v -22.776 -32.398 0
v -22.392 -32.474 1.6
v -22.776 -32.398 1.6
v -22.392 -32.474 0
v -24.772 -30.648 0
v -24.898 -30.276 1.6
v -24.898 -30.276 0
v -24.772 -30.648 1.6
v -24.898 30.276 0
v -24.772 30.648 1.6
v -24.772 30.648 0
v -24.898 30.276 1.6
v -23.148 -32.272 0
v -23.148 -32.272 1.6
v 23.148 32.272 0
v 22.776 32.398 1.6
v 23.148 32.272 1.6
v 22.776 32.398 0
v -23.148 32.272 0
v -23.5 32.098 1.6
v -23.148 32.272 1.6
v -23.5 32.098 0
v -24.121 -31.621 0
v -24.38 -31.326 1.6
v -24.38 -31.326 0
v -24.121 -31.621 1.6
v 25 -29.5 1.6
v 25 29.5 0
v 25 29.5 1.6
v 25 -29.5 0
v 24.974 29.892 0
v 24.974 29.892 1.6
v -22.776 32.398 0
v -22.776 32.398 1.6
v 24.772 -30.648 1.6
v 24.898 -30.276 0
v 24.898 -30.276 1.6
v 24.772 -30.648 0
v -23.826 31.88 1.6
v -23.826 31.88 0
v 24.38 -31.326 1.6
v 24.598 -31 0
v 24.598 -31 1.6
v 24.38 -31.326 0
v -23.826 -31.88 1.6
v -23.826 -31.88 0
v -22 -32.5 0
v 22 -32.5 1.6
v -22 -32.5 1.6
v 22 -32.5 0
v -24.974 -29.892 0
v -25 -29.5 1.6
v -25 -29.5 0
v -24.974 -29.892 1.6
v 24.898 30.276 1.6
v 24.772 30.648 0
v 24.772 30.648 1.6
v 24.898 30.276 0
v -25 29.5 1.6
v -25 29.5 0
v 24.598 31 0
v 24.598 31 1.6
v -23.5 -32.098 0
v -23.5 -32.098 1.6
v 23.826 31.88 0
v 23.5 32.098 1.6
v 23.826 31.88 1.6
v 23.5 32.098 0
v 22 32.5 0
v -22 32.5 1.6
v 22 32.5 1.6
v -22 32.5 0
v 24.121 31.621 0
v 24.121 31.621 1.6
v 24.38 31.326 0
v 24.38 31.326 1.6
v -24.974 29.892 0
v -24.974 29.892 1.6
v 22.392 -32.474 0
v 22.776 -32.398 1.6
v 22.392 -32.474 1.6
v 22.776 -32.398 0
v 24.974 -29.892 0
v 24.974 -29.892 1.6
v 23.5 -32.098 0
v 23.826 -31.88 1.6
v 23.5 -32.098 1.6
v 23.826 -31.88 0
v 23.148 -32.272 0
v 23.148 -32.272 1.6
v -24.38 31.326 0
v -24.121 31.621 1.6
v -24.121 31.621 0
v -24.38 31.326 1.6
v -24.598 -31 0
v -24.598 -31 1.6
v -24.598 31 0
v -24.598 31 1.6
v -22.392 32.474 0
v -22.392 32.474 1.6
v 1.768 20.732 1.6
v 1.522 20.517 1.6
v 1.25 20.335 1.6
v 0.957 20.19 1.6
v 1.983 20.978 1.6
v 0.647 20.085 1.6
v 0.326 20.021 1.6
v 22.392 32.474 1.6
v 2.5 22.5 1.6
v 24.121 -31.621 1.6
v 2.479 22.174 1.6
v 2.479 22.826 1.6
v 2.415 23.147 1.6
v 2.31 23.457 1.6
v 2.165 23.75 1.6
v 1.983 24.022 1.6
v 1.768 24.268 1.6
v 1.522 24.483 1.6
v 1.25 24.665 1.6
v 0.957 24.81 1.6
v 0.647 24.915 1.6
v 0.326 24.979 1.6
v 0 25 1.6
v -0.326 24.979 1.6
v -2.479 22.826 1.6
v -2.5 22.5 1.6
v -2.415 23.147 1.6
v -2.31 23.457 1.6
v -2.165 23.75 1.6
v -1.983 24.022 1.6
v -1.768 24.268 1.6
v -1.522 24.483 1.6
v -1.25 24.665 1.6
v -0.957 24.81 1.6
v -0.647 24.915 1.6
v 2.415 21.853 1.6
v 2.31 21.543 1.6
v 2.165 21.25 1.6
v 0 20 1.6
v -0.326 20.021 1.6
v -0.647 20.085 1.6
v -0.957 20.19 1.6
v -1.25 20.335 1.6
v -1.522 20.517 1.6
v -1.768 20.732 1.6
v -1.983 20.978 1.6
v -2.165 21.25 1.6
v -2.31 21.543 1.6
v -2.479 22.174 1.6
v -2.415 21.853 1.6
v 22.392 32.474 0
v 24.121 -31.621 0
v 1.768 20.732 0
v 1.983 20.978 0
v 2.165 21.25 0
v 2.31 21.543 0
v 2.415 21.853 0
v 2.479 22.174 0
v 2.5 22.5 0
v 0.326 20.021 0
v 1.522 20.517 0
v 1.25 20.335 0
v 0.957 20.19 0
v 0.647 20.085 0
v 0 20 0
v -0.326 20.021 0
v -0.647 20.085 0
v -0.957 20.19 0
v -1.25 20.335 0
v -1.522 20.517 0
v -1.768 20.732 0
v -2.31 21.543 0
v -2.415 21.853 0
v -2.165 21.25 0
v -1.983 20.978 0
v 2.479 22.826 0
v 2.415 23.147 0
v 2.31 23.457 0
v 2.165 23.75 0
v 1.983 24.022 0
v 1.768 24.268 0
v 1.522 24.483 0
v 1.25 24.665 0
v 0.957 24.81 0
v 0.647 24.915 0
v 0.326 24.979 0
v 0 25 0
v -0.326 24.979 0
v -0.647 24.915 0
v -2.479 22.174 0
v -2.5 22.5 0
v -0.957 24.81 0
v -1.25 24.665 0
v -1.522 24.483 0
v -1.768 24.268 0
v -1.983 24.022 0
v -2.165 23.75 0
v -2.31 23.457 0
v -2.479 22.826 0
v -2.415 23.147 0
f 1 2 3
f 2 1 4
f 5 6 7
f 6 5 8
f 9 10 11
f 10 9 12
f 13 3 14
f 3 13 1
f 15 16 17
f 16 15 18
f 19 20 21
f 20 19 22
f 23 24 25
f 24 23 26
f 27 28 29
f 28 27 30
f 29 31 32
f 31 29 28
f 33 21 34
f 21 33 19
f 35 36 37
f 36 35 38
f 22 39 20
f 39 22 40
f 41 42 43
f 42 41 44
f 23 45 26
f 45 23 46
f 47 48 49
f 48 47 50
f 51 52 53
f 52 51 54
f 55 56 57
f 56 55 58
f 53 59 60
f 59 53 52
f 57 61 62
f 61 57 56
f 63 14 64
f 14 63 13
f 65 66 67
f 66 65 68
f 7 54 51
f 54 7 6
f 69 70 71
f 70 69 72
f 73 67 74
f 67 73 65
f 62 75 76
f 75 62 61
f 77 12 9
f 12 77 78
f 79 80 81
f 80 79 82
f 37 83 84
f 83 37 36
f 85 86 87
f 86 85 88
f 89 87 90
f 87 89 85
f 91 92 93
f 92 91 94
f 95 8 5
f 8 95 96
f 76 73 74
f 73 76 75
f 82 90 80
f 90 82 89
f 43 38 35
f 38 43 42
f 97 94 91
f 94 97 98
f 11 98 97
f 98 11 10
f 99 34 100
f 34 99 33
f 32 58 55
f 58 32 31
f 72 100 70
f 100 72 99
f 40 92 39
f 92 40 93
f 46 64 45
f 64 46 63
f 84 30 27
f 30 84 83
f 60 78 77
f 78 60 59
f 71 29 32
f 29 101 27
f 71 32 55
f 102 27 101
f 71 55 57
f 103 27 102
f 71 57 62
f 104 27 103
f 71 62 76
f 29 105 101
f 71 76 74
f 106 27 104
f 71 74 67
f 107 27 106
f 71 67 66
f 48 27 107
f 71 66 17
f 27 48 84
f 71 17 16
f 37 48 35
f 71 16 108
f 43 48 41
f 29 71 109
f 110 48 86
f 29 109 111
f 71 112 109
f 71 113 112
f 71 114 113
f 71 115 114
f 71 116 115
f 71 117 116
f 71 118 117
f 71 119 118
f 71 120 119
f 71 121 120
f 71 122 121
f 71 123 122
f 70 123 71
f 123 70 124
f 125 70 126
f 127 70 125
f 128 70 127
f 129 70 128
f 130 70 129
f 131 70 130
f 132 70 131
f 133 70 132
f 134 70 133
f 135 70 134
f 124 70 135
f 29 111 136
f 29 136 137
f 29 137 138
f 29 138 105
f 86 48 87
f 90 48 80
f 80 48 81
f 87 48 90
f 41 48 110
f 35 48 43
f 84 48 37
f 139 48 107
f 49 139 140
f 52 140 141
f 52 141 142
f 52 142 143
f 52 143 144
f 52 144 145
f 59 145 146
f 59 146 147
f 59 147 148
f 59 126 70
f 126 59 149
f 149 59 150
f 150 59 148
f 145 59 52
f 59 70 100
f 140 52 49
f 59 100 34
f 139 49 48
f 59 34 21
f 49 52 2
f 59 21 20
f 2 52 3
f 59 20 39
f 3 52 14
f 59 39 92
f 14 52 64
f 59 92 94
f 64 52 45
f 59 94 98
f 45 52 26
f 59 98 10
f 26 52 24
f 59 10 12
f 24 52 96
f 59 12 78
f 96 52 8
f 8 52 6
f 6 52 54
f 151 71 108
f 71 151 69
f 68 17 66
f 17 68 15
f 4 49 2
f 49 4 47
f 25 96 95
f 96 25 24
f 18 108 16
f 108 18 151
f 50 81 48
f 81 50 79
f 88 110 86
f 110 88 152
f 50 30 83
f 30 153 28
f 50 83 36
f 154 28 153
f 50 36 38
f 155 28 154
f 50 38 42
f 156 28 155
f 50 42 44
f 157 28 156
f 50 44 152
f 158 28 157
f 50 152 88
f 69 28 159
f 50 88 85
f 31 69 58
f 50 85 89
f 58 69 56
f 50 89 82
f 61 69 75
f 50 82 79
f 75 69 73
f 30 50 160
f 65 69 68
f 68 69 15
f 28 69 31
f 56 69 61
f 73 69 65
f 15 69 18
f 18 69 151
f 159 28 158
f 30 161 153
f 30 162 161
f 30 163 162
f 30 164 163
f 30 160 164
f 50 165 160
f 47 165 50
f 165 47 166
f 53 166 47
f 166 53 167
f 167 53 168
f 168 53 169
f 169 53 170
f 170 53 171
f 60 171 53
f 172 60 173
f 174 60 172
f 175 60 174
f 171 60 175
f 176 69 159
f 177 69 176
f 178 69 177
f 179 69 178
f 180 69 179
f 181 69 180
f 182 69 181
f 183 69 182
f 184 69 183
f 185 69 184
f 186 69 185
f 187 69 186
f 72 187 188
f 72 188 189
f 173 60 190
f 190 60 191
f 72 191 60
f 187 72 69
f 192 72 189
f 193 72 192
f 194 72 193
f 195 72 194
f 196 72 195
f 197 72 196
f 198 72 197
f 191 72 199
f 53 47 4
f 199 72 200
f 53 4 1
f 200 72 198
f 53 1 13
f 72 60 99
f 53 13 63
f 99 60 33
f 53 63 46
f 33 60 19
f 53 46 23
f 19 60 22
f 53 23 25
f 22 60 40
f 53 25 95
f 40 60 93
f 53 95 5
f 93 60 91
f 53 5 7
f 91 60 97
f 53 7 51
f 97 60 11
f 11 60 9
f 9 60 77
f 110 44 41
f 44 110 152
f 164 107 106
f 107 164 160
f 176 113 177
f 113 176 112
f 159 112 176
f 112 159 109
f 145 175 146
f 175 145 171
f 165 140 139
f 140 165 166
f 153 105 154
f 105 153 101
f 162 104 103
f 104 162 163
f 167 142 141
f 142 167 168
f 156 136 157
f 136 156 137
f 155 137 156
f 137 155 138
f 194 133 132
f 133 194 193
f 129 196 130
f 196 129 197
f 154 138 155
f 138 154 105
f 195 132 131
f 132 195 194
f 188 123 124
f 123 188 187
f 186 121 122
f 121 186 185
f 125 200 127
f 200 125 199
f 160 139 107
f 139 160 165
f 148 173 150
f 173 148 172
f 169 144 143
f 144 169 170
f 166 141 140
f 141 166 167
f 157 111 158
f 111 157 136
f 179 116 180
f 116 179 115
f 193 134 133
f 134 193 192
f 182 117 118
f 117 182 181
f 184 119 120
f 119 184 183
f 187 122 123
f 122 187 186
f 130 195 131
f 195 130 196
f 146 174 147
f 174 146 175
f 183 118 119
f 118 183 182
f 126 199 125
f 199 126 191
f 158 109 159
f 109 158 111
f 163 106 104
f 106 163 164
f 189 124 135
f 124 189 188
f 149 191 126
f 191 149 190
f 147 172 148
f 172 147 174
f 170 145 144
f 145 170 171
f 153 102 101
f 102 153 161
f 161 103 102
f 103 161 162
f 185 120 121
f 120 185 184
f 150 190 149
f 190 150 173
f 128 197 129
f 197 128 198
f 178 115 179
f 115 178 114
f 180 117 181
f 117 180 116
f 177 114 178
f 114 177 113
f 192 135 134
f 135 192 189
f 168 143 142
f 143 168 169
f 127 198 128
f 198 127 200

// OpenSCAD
// file: media/odoo_qr_modules.scad
// Auto-generated QR module coordinates
qr_modules = [
    [0, 0],
    [0, 1],
    [0, 2],
    [0, 3],
    [0, 4],
    [0, 5],
    [0, 6],
    [0, 8],
    [0, 9],
    [0, 10],
    [0, 13],
    [0, 14],
    [0, 15],
    [0, 16],
    [0, 18],
    [0, 19],
    [0, 20],
    [0, 21],
    [0, 22],
    [0, 23],
    [0, 24],
    [1, 0],
    [1, 6],
    [1, 8],
    [1, 10],
    [1, 13],
    [1, 14],
    [1, 18],
    [1, 24],
    [2, 0],
    [2, 2],
    [2, 3],
    [2, 4],
    [2, 6],
    [2, 9],
    [2, 11],
    [2, 13],
    [2, 18],
    [2, 20],
    [2, 21],
    [2, 22],
    [2, 24],
    [3, 0],
    [3, 2],
    [3, 3],
    [3, 4],
    [3, 6],
    [3, 8],
    [3, 12],
    [3, 13],
    [3, 14],
    [3, 16],
    [3, 18],
    [3, 20],
    [3, 21],
    [3, 22],
    [3, 24],
    [4, 0],
    [4, 2],
    [4, 3],
    [4, 4],
    [4, 6],
    [4, 8],
    [4, 11],
    [4, 14],
    [4, 18],
    [4, 20],
    [4, 21],
    [4, 22],
    [4, 24],
    [5, 0],
    [5, 6],
    [5, 10],
    [5, 11],
    [5, 12],
    [5, 15],
    [5, 16],
    [5, 18],
    [5, 24],
    [6, 0],
    [6, 1],
    [6, 2],
    [6, 3],
    [6, 4],
    [6, 5],
    [6, 6],
    [6, 8],
    [6, 10],
    [6, 12],
    [6, 14],
    [6, 16],
    [6, 18],
    [6, 19],
    [6, 20],
    [6, 21],
    [6, 22],
    [6, 23],
    [6, 24],
    [7, 9],
    [7, 11],
    [7, 13],
    [7, 16],
    [8, 0],
    [8, 6],
    [8, 7],
    [8, 10],
    [8, 13],
    [8, 14],
    [8, 15],
    [8, 17],
    [8, 20],
    [8, 21],
    [8, 23],
    [8, 24],
    [9, 1],
    [9, 2],
    [9, 3],
    [9, 9],
    [9, 12],
    [9, 14],
    [9, 15],
    [9, 19],
    [9, 24],
    [10, 0],
    [10, 1],
    [10, 6],
    [10, 7],
    [10, 8],
    [10, 9],
    [10, 10],
    [10, 12],
    [10, 16],
    [10, 17],
    [10, 20],
    [10, 21],
    [10, 22],
    [10, 23],
    [10, 24],
    [11, 2],
    [11, 5],
    [11, 7],
    [11, 8],
    [11, 9],
    [11, 10],
    [11, 13],
    [11, 15],
    [11, 18],
    [11, 21],
    [11, 22],
    [12, 2],
    [12, 3],
    [12, 5],
    [12, 6],
    [12, 8],
    [12, 9],
    [12, 12],
    [12, 16],
    [12, 18],
    [12, 20],
    [12, 24],
    [13, 1],
    [13, 2],
    [13, 3],
    [13, 4],
    [13, 5],
    [13, 7],
    [13, 10],
    [13, 13],
    [13, 14],
    [13, 16],
    [13, 18],
    [13, 19],
    [13, 21],
    [13, 22],
    [14, 0],
    [14, 1],
    [14, 2],
    [14, 4],
    [14, 5],
    [14, 6],
    [14, 7],
    [14, 8],
    [14, 9],
    [14, 11],
    [14, 12],
    [14, 14],
    [14, 15],
    [14, 16],
    [14, 17],
    [14, 21],
    [15, 8],
    [15, 9],
    [15, 10],
    [15, 12],
    [15, 13],
    [15, 14],
    [15, 15],
    [15, 19],
    [15, 20],
    [15, 21],
    [15, 22],
    [16, 2],
    [16, 4],
    [16, 6],
    [16, 7],
    [16, 8],
    [16, 10],
    [16, 12],
    [16, 13],
    [16, 14],
    [16, 16],
    [16, 17],
    [16, 18],
    [16, 19],
    [16, 20],
    [16, 21],
    [16, 22],
    [16, 24],
    [17, 14],
    [17, 16],
    [17, 20],
    [17, 21],
    [17, 22],
    [18, 0],
    [18, 1],
    [18, 2],
    [18, 3],
    [18, 4],
    [18, 5],
    [18, 6],
    [18, 8],
    [18, 10],
    [18, 11],
    [18, 12],
    [18, 16],
    [18, 18],
    [18, 20],
    [18, 21],
    [18, 23],
    [19, 0],
    [19, 6],
    [19, 9],
    [19, 12],
    [19, 15],
    [19, 16],
    [19, 20],
    [19, 23],
    [20, 0],
    [20, 2],
    [20, 3],
    [20, 4],
    [20, 6],
    [20, 9],
    [20, 13],
    [20, 14],
    [20, 16],
    [20, 17],
    [20, 18],
    [20, 19],
    [20, 20],
    [20, 22],
    [20, 23],
    [21, 0],
    [21, 2],
    [21, 3],
    [21, 4],
    [21, 6],
    [21, 9],
    [21, 10],
    [21, 11],
    [21, 14],
    [21, 15],
    [21, 22],
    [21, 24],
    [22, 0],
    [22, 2],
    [22, 3],
    [22, 4],
    [22, 6],
    [22, 9],
    [22, 11],
    [22, 14],
    [22, 15],
    [22, 16],
    [22, 17],
    [22, 22],
    [22, 23],
    [23, 0],
    [23, 6],
    [23, 9],
    [23, 11],
    [23, 13],
    [23, 14],
    [23, 16],
    [23, 17],
    [23, 22],
    [23, 23],
    [24, 0],
    [24, 1],
    [24, 2],
    [24, 3],
    [24, 4],
    [24, 5],
    [24, 6],
    [24, 8],
    [24, 10],
    [24, 11],
    [24, 12],
    [24, 14],
    [24, 15],
    [24, 18],
    [24, 19],
    [24, 20],
    [24, 22],
    [24, 23],
    [24, 24]
];
// main file
// QR code tag for filament-swap printing
// Generates a printable tag with raised QR modules on a flat base.
// URL encoded in QR: https://bengineering45.odoo.com/

include <media/odoo_qr_modules.scad>

url = "https://bengineering45.odoo.com/";

// Tag dimensions (mm)
tag_width = 50;
tag_height = 65;
tag_thickness = 1.6;
corner_radius = 3;

// Raised QR settings (mm)
qr_size = 38;
qr_modules_per_side = 25;  // active QR pattern size
qr_raise = 1.0;   // enough for a clean filament-swap top layer
qr_margin = 0;

// Hole
hole_diameter = 5;
hole_offset_y = 10;

// Border around QR area (mm)
qr_top_margin = 20;
qr_bottom_margin = 8;

$fn = 48;

module rounded_tag(w, h, r, t) {
    linear_extrude(height=t)
        hull() {
            for (x = [-w/2 + r, w/2 - r])
                for (y = [-h/2 + r, h/2 - r])
                    translate([x, y]) circle(r=r);
        }
}

module base_tag() {
    difference() {
        rounded_tag(tag_width, tag_height, corner_radius, tag_thickness);
        translate([0, tag_height/2 - hole_offset_y, -0.1])
            cylinder(h=tag_thickness + 0.2, d=hole_diameter);
    }
}

module raised_qr() {
    qr_area_h = qr_size;
    qr_center_y = (tag_height/2 - qr_top_margin - qr_area_h/2);
    module_pitch = qr_size / qr_modules_per_side;

    translate([0, qr_center_y, tag_thickness])
        linear_extrude(height=qr_raise)
            union() {
                for (m = qr_modules)
                    translate([
                        (m[0] - qr_modules_per_side/2) * module_pitch + module_pitch/2,
                        ((qr_modules_per_side - 1 - m[1]) - qr_modules_per_side/2) * module_pitch + module_pitch/2
                    ])
                        square([module_pitch, module_pitch], center=true);
            }
}

base_tag();
color("black") raised_qr();
